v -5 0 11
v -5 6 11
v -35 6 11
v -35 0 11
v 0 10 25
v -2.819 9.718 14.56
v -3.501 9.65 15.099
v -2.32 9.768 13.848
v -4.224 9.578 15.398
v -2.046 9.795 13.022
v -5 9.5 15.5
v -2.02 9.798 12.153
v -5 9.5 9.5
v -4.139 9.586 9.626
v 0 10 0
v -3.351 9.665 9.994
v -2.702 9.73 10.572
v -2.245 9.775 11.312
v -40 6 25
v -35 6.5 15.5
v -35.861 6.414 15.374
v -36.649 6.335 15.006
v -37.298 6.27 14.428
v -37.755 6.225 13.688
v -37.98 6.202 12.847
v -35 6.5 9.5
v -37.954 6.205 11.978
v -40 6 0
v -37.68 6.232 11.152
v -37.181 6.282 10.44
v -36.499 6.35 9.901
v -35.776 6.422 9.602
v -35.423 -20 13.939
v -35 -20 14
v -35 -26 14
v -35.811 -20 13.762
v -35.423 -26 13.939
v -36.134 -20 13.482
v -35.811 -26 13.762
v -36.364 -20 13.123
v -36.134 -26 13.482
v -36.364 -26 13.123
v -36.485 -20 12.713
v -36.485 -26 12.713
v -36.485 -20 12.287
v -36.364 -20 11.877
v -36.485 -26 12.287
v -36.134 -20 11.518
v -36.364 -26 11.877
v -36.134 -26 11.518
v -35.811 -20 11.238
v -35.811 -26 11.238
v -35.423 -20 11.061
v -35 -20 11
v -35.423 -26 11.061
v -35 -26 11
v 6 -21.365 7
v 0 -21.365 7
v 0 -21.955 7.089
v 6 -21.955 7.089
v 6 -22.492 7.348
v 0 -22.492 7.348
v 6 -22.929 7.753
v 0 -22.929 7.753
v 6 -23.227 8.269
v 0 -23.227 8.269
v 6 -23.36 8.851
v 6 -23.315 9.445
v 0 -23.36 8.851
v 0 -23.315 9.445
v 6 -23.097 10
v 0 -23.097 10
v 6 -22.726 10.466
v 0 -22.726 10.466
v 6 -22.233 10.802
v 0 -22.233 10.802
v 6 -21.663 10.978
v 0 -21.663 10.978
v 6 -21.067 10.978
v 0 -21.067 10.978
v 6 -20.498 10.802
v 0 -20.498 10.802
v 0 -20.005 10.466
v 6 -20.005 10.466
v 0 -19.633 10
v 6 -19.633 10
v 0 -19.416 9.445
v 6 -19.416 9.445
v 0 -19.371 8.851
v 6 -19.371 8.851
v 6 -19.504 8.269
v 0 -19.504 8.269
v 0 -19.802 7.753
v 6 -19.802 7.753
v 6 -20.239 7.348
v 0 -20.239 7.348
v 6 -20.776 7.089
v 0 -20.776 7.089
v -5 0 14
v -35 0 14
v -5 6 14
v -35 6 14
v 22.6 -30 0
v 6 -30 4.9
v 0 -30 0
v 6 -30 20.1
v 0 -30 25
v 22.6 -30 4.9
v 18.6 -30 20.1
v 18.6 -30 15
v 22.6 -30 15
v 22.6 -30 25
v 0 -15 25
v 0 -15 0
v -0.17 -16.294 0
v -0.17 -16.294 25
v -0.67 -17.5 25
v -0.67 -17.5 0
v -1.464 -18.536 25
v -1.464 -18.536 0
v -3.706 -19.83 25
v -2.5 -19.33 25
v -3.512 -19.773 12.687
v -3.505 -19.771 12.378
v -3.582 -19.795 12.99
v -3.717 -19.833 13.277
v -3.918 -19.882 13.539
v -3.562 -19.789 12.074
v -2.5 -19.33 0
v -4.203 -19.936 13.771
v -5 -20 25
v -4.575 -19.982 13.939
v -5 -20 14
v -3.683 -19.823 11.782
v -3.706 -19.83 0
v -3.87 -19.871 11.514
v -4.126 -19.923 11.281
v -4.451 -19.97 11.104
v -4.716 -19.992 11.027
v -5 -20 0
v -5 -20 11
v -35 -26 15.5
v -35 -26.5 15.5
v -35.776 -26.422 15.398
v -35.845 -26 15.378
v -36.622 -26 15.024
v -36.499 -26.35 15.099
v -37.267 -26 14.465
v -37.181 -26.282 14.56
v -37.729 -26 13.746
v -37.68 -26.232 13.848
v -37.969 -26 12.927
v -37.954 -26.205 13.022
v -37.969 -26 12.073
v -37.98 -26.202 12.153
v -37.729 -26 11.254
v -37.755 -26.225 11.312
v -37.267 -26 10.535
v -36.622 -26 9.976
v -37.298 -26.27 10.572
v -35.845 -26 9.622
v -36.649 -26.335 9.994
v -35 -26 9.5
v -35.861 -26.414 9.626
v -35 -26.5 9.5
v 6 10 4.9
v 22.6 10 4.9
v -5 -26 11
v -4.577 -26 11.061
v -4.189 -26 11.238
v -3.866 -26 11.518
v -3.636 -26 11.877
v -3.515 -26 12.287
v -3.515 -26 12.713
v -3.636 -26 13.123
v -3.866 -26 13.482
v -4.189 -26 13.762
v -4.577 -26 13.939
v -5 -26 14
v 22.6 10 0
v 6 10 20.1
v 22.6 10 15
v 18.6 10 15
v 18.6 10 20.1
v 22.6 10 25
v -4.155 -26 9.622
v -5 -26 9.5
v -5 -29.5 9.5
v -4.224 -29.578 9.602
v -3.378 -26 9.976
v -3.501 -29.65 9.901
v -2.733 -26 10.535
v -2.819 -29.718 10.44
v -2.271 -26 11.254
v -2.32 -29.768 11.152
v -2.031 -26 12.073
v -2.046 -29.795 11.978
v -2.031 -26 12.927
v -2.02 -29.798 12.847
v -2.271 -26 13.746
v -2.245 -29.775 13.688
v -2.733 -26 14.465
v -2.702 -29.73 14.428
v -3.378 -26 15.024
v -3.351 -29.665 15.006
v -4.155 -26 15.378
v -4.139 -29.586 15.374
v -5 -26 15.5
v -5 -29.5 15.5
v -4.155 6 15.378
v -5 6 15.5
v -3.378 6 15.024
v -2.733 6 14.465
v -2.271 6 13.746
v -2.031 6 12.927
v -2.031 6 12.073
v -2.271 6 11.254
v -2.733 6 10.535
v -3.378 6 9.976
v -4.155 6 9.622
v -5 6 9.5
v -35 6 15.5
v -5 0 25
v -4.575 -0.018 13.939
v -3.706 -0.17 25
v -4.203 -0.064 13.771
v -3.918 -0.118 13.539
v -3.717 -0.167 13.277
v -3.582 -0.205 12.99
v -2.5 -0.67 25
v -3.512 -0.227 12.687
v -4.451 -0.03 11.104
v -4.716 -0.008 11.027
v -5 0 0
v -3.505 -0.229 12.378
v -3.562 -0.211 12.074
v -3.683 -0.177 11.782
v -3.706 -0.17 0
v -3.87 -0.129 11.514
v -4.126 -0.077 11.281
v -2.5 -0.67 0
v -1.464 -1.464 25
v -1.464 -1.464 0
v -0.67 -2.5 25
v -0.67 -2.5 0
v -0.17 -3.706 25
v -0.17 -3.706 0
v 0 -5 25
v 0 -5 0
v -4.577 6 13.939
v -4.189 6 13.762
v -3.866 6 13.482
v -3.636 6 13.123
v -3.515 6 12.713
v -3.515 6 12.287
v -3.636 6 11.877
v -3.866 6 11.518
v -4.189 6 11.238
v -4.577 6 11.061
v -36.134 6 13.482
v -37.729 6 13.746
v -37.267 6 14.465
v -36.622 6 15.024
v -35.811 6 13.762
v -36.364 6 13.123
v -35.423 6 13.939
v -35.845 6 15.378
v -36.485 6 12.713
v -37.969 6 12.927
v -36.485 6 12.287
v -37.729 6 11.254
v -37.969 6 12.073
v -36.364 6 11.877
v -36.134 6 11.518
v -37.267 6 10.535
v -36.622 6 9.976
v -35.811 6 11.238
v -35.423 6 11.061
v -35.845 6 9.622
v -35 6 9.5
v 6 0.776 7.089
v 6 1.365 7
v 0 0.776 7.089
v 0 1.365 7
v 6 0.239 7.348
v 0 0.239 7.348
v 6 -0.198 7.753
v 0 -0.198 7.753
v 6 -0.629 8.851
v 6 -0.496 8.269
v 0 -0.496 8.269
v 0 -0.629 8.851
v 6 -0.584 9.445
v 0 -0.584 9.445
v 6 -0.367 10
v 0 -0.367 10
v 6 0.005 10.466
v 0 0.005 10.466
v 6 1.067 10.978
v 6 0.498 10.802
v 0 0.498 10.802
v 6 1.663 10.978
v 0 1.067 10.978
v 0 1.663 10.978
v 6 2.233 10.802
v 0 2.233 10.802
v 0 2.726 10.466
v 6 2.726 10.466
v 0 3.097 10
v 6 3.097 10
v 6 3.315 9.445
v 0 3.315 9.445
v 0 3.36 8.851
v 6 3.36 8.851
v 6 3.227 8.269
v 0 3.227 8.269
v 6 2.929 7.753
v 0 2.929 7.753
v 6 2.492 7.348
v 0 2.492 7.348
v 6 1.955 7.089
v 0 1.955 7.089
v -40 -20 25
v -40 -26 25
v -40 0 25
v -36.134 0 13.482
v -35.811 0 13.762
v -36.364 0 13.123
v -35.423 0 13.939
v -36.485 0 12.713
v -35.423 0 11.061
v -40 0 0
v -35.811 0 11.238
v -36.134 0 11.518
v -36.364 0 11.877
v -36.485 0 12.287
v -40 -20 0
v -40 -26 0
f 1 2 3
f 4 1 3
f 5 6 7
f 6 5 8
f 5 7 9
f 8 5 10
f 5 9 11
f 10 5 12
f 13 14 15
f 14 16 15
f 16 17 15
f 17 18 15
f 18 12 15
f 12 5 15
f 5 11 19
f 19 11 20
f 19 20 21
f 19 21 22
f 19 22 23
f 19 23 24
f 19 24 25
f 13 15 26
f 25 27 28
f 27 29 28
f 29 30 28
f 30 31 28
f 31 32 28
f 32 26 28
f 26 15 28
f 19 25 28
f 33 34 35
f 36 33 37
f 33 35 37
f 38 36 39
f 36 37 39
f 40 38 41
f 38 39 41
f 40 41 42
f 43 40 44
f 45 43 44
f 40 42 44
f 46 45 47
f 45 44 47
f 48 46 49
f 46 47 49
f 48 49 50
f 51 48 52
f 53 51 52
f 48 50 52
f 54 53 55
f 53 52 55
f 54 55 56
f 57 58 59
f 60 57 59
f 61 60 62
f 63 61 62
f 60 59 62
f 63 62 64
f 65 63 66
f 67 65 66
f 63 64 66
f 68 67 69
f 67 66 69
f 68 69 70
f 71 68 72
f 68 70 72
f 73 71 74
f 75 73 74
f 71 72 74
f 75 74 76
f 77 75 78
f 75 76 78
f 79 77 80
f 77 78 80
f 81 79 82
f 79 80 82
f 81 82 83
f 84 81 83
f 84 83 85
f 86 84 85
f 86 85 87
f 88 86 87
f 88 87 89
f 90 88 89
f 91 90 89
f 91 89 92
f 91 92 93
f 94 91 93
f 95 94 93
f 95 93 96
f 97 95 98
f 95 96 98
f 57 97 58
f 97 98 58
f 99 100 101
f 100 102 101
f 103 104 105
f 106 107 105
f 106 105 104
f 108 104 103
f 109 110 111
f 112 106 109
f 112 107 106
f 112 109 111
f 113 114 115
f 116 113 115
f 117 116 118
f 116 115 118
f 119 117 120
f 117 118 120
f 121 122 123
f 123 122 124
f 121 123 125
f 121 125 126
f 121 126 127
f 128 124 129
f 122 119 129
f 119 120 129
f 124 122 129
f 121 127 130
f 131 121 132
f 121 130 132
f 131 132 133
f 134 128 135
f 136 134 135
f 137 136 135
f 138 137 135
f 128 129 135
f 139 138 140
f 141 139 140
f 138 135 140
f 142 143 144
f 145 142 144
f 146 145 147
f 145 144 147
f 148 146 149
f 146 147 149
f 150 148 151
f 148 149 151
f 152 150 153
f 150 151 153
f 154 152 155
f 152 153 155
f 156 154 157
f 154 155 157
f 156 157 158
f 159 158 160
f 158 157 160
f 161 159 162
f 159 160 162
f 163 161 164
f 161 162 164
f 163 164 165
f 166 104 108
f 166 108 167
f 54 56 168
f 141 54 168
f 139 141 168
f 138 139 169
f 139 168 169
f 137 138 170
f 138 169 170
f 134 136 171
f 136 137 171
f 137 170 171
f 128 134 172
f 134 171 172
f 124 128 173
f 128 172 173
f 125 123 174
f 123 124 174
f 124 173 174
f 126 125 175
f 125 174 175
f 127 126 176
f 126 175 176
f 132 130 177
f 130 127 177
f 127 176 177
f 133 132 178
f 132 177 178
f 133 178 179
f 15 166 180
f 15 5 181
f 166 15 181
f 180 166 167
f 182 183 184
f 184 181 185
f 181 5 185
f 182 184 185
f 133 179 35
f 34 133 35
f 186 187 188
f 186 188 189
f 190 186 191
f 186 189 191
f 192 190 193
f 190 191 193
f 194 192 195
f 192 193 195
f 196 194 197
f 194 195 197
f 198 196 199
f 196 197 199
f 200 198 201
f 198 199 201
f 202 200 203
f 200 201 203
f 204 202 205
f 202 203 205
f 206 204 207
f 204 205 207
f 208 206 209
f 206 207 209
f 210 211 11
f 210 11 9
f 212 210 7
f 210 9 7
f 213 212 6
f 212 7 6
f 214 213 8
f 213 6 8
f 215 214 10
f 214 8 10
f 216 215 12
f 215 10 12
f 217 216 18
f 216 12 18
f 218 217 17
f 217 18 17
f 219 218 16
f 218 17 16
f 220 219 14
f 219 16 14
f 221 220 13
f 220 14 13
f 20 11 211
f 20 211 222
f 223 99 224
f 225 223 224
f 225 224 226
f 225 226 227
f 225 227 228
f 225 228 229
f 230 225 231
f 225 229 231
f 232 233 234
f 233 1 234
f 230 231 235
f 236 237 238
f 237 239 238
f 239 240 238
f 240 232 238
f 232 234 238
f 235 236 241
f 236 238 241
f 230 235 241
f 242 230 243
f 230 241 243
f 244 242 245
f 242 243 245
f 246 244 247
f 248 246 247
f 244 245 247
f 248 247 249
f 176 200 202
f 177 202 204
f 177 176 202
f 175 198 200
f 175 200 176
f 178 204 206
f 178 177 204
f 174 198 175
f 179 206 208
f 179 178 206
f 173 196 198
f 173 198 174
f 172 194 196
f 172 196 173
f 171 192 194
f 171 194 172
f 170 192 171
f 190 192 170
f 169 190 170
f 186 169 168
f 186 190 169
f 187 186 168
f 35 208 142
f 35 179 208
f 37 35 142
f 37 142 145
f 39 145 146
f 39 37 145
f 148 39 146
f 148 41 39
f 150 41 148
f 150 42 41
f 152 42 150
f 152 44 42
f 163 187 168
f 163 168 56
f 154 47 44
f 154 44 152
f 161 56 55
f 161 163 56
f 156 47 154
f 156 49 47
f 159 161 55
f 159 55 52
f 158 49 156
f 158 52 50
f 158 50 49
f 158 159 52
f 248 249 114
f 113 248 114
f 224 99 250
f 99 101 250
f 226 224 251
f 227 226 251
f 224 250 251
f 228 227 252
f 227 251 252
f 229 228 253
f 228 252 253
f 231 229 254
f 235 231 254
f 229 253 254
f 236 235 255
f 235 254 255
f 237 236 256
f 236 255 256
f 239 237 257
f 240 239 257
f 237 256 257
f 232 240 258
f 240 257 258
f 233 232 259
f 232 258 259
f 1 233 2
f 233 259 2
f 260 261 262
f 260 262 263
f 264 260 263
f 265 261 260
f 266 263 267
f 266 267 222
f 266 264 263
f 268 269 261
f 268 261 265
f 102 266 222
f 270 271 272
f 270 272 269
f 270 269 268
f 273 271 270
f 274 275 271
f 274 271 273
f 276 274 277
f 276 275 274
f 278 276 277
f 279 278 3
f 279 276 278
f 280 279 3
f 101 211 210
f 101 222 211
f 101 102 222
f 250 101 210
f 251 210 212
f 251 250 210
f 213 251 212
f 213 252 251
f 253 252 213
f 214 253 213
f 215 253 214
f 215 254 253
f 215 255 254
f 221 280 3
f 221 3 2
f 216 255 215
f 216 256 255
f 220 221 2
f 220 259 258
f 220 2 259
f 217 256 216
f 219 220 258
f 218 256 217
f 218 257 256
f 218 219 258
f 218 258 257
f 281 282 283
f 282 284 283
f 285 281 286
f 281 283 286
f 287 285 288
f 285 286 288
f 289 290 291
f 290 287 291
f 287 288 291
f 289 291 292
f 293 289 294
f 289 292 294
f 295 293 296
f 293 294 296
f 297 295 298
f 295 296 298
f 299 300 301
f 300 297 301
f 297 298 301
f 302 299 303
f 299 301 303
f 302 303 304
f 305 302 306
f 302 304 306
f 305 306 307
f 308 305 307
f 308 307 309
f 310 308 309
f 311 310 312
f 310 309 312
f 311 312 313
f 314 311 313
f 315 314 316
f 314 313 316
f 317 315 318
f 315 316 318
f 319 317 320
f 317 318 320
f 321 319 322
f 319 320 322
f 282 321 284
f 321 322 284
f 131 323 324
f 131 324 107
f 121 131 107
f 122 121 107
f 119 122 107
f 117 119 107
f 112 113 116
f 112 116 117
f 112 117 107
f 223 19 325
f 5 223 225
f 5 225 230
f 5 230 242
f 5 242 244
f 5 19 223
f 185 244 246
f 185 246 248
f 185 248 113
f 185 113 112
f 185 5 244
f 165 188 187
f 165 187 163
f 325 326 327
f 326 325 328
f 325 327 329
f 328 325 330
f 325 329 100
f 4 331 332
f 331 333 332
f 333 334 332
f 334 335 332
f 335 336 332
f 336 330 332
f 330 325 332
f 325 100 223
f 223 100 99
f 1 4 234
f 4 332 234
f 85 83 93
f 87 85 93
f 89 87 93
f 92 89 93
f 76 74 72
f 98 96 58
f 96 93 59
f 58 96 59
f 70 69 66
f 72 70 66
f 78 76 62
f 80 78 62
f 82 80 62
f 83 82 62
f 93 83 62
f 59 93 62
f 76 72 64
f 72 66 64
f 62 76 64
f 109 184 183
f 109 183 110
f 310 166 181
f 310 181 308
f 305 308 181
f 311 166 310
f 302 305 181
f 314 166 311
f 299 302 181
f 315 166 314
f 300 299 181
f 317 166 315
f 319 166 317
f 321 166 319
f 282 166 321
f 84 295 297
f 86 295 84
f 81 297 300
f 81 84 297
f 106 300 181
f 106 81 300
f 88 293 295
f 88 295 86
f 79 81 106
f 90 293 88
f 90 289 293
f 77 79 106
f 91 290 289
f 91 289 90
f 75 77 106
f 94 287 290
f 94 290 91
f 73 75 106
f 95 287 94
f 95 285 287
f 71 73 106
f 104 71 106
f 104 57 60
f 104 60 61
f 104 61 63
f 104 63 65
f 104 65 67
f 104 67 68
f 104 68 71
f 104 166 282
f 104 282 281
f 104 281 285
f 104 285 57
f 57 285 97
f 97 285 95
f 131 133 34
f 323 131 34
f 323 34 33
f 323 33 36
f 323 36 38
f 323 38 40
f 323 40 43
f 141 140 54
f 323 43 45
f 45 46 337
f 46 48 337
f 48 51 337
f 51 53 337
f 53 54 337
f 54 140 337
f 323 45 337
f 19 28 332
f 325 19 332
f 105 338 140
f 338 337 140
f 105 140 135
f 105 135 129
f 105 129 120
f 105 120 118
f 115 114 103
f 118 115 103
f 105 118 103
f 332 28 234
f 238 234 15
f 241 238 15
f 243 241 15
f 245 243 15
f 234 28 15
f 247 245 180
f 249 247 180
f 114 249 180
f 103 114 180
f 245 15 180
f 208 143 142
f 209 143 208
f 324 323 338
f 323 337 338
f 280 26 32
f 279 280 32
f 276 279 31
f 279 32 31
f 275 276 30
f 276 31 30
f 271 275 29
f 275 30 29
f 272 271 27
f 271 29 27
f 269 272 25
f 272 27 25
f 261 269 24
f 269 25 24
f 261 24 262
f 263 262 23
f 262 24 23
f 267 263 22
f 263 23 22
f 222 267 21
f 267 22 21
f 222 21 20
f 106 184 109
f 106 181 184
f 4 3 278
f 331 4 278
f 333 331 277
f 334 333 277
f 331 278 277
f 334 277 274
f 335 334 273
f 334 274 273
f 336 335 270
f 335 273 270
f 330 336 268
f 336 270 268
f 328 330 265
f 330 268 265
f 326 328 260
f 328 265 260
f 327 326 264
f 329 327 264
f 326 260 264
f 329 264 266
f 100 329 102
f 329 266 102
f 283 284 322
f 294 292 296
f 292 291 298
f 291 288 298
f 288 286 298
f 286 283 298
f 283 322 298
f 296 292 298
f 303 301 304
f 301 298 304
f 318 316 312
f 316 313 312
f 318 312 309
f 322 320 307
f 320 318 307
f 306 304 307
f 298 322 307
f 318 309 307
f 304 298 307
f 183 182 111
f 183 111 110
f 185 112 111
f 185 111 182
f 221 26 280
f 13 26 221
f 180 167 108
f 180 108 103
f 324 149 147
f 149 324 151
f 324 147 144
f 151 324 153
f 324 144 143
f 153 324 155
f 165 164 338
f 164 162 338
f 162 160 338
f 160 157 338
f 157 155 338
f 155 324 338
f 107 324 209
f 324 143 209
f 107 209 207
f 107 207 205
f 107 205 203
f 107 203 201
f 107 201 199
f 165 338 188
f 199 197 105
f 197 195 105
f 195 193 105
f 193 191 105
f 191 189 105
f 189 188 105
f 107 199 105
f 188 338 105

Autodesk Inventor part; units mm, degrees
ref_plane "YZ Plane" through (0, 0, 0) normal (1, 0, 0) x (0, 1, 0)
ref_plane "XZ Plane" through (0, 0, 0) normal (0, 1, 0) x (-1, 0, 0)
sketch "Sketch1" plane through (0, 0, 0) normal (0, 0, 1) x (1, 0, 0)
  line L0 (-40, 0) -> (0, 0)
  line L1 (0, 0) -> (0, -20)
  line L2 (0, -20) -> (-40, -20)
  line L3 (-40, -20) -> (-40, -26)
  line L4 (-40, -26) -> (0, -30)
  line L5 (0, -30) -> (6, -30)
  line L6 (6, -30) -> (6, 10)
  line L7 (6, 10) -> (0, 10)
  line L8 (0, 10) -> (-40, 6)
  line L9 (-40, 6) -> (-40, 0)
  dimension "d0" = 6
  dimension "d1" = 40
  dimension "d2" = 20
  dimension "d3" = 40
extrude "Extrusion1" add sketch "Sketch1" along normal blind 25
sketch "Sketch2" plane through (6, -30, 0) normal (1, 0, 0) x (0, 0, -1)
  line L0 (0, 40) -> (-25, 40) projected
  line L1 (0, 0) -> (-25, 0) projected
  line L2 (-25, 40) -> (-20, 40)
  line L3 (-20, 40) -> (-20, 0)
  line L4 (-20, 0) -> (-25, 0)
  line L5 (-25, 0) -> (-25, 40)
  line L6 (0, 0) -> (-5, 0)
  line L7 (-5, 0) -> (-5, 40)
  line L8 (-5, 40) -> (0, 40)
  line L9 (0, 40) -> (0, 0)
  circle A0 centre (-9, 8.6346) radius 1.7
  line L10 (-2.5, 11.8846) -> (-2.5, 5.3846)
  point P0 (0, 30)
  point P1 (-25, 0)
  point P2 (-5, 0)
  dimension "d6" = 5
  dimension "d7" = 5
  dimension "d30" = 4
  dimension "d31" = 8.6346
extrude "Extrusion2" add sketch "Sketch2" along normal blind 16.6 contours L9 L1 L7 L0 | L3 L1 L5 L0
hole "Hole2" at (6, -21.3654, 9) direction (-1, 0, 0) diameter 4 depth 6
sketch "Sketch3" plane through (0, 0, 0) normal (0, 0, -1) x (-1, 0, 0)
  line L0 (0, 0) -> (0, -20) projected
  arc A0 (0, -15) -> (5, -20) centre (5, -15) ccw
  arc A1 (5, 0) -> (0, -5) centre (5, -5) ccw
  line L1 (0, -20) -> (40, -20) projected
  line L2 (40, 0) -> (0, 0) projected
  dimension "d27" = 5
extrude "Extrusion3" add sketch "Sketch3" against normal up to surface (25 mm away)
sketch "Sketch4" plane through (0, 10, 25) normal (0, 1, 0) x (1, 0, 0)
  line L0 (-5, 12.5) -> (-35, 12.5) construction
  line L1 (-5, 9.5) -> (-35, 9.5)
  line L2 (-35, 15.5) -> (-5, 15.5)
  arc A0 (-5, 9.5) -> (-5, 15.5) centre (-5, 12.5) ccw
  arc A1 (-35, 15.5) -> (-35, 9.5) centre (-35, 12.5) ccw
  line L3 (-40, 25) -> (-40, 0) projected
  line L4 (0, 25) -> (0, 0) projected
  point P0 (-20, 12.5)
  point P1 (0, 12.5)
  dimension "d32" = 3
  dimension "d33" = 5
  dimension "d34" = 5
extrude "Extrusion4" cut sketch "Sketch4" against normal blind 4
sketch "Sketch5" plane through (0, 6, 25) normal (0, 1, 0) x (1, 0, 0)
  line L0 (-5, 12.5) -> (-35, 12.5) construction
  line L1 (-5, 14) -> (-35, 14)
  line L2 (-35, 11) -> (-5, 11)
  arc A0 (-5, 11) -> (-5, 14) centre (-5, 12.5) ccw
  arc A1 (-35, 14) -> (-35, 11) centre (-35, 12.5) ccw
  line L3 (-5, 9.5) -> (-35, 9.5) projected
  arc A2 (-5, 9.5) -> (-5, 15.5) centre (-5, 12.5) ccw projected
  line L4 (-35, 15.5) -> (-5, 15.5) projected
  arc A3 (-35, 15.5) -> (-35, 9.5) centre (-35, 12.5) ccw projected
  point P0 (0, 25)
  point P1 (-20, 12.5)
  dimension "d37" = 1.5
extrude "Extrusion5" cut sketch "Sketch5" against normal blind 10.75 contours A0 L2 A1 L1
ref_plane "Work Plane1" through (-40, -10, 25) normal (0, 1, 0) x (1, 0, 0)
mirror "Mirror1" about plane through (-40, -10, 25) normal (0, 1, 0) of "Extrusion4", "Extrusion5", "Hole2"
sketch "Sketch6" plane through (6, -30, 20) normal (0, 0, -1) x (-1, 0, 0)
  line L0 (0, 40) -> (0, 0) projected
  line L1 (0, 40) -> (-16.6, 40) projected
  line L2 (-16.6, 0) -> (-16.6, 40) projected
  line L3 (0, 0) -> (-16.6, 0) projected
  line L4 (-16.6, 40) -> (-16.6, 0) projected
  line L5 (0, 0) -> (-16.6, 0) projected
  line L6 (-16.6, 40) -> (-12.6, 40)
  line L7 (-12.6, 40) -> (-12.6, 0)
  line L8 (-12.6, 0) -> (-16.6, 0)
  line L9 (-16.6, 0) -> (-16.6, 40)
  point P0 (6, 30)
  dimension "d40" = 4
extrude "Extrusion6" add sketch "Sketch6" along normal blind 5 contours L7 L3 L2 L1
thicken "Thicken1" operation add thickness 0.1 both sides no extend neighbours yes toward (0, 0, 1) faces at (14.4, -3.3333, 20) (11.5333, -3.3333, 5)
properties part number "Z Belt 2"
